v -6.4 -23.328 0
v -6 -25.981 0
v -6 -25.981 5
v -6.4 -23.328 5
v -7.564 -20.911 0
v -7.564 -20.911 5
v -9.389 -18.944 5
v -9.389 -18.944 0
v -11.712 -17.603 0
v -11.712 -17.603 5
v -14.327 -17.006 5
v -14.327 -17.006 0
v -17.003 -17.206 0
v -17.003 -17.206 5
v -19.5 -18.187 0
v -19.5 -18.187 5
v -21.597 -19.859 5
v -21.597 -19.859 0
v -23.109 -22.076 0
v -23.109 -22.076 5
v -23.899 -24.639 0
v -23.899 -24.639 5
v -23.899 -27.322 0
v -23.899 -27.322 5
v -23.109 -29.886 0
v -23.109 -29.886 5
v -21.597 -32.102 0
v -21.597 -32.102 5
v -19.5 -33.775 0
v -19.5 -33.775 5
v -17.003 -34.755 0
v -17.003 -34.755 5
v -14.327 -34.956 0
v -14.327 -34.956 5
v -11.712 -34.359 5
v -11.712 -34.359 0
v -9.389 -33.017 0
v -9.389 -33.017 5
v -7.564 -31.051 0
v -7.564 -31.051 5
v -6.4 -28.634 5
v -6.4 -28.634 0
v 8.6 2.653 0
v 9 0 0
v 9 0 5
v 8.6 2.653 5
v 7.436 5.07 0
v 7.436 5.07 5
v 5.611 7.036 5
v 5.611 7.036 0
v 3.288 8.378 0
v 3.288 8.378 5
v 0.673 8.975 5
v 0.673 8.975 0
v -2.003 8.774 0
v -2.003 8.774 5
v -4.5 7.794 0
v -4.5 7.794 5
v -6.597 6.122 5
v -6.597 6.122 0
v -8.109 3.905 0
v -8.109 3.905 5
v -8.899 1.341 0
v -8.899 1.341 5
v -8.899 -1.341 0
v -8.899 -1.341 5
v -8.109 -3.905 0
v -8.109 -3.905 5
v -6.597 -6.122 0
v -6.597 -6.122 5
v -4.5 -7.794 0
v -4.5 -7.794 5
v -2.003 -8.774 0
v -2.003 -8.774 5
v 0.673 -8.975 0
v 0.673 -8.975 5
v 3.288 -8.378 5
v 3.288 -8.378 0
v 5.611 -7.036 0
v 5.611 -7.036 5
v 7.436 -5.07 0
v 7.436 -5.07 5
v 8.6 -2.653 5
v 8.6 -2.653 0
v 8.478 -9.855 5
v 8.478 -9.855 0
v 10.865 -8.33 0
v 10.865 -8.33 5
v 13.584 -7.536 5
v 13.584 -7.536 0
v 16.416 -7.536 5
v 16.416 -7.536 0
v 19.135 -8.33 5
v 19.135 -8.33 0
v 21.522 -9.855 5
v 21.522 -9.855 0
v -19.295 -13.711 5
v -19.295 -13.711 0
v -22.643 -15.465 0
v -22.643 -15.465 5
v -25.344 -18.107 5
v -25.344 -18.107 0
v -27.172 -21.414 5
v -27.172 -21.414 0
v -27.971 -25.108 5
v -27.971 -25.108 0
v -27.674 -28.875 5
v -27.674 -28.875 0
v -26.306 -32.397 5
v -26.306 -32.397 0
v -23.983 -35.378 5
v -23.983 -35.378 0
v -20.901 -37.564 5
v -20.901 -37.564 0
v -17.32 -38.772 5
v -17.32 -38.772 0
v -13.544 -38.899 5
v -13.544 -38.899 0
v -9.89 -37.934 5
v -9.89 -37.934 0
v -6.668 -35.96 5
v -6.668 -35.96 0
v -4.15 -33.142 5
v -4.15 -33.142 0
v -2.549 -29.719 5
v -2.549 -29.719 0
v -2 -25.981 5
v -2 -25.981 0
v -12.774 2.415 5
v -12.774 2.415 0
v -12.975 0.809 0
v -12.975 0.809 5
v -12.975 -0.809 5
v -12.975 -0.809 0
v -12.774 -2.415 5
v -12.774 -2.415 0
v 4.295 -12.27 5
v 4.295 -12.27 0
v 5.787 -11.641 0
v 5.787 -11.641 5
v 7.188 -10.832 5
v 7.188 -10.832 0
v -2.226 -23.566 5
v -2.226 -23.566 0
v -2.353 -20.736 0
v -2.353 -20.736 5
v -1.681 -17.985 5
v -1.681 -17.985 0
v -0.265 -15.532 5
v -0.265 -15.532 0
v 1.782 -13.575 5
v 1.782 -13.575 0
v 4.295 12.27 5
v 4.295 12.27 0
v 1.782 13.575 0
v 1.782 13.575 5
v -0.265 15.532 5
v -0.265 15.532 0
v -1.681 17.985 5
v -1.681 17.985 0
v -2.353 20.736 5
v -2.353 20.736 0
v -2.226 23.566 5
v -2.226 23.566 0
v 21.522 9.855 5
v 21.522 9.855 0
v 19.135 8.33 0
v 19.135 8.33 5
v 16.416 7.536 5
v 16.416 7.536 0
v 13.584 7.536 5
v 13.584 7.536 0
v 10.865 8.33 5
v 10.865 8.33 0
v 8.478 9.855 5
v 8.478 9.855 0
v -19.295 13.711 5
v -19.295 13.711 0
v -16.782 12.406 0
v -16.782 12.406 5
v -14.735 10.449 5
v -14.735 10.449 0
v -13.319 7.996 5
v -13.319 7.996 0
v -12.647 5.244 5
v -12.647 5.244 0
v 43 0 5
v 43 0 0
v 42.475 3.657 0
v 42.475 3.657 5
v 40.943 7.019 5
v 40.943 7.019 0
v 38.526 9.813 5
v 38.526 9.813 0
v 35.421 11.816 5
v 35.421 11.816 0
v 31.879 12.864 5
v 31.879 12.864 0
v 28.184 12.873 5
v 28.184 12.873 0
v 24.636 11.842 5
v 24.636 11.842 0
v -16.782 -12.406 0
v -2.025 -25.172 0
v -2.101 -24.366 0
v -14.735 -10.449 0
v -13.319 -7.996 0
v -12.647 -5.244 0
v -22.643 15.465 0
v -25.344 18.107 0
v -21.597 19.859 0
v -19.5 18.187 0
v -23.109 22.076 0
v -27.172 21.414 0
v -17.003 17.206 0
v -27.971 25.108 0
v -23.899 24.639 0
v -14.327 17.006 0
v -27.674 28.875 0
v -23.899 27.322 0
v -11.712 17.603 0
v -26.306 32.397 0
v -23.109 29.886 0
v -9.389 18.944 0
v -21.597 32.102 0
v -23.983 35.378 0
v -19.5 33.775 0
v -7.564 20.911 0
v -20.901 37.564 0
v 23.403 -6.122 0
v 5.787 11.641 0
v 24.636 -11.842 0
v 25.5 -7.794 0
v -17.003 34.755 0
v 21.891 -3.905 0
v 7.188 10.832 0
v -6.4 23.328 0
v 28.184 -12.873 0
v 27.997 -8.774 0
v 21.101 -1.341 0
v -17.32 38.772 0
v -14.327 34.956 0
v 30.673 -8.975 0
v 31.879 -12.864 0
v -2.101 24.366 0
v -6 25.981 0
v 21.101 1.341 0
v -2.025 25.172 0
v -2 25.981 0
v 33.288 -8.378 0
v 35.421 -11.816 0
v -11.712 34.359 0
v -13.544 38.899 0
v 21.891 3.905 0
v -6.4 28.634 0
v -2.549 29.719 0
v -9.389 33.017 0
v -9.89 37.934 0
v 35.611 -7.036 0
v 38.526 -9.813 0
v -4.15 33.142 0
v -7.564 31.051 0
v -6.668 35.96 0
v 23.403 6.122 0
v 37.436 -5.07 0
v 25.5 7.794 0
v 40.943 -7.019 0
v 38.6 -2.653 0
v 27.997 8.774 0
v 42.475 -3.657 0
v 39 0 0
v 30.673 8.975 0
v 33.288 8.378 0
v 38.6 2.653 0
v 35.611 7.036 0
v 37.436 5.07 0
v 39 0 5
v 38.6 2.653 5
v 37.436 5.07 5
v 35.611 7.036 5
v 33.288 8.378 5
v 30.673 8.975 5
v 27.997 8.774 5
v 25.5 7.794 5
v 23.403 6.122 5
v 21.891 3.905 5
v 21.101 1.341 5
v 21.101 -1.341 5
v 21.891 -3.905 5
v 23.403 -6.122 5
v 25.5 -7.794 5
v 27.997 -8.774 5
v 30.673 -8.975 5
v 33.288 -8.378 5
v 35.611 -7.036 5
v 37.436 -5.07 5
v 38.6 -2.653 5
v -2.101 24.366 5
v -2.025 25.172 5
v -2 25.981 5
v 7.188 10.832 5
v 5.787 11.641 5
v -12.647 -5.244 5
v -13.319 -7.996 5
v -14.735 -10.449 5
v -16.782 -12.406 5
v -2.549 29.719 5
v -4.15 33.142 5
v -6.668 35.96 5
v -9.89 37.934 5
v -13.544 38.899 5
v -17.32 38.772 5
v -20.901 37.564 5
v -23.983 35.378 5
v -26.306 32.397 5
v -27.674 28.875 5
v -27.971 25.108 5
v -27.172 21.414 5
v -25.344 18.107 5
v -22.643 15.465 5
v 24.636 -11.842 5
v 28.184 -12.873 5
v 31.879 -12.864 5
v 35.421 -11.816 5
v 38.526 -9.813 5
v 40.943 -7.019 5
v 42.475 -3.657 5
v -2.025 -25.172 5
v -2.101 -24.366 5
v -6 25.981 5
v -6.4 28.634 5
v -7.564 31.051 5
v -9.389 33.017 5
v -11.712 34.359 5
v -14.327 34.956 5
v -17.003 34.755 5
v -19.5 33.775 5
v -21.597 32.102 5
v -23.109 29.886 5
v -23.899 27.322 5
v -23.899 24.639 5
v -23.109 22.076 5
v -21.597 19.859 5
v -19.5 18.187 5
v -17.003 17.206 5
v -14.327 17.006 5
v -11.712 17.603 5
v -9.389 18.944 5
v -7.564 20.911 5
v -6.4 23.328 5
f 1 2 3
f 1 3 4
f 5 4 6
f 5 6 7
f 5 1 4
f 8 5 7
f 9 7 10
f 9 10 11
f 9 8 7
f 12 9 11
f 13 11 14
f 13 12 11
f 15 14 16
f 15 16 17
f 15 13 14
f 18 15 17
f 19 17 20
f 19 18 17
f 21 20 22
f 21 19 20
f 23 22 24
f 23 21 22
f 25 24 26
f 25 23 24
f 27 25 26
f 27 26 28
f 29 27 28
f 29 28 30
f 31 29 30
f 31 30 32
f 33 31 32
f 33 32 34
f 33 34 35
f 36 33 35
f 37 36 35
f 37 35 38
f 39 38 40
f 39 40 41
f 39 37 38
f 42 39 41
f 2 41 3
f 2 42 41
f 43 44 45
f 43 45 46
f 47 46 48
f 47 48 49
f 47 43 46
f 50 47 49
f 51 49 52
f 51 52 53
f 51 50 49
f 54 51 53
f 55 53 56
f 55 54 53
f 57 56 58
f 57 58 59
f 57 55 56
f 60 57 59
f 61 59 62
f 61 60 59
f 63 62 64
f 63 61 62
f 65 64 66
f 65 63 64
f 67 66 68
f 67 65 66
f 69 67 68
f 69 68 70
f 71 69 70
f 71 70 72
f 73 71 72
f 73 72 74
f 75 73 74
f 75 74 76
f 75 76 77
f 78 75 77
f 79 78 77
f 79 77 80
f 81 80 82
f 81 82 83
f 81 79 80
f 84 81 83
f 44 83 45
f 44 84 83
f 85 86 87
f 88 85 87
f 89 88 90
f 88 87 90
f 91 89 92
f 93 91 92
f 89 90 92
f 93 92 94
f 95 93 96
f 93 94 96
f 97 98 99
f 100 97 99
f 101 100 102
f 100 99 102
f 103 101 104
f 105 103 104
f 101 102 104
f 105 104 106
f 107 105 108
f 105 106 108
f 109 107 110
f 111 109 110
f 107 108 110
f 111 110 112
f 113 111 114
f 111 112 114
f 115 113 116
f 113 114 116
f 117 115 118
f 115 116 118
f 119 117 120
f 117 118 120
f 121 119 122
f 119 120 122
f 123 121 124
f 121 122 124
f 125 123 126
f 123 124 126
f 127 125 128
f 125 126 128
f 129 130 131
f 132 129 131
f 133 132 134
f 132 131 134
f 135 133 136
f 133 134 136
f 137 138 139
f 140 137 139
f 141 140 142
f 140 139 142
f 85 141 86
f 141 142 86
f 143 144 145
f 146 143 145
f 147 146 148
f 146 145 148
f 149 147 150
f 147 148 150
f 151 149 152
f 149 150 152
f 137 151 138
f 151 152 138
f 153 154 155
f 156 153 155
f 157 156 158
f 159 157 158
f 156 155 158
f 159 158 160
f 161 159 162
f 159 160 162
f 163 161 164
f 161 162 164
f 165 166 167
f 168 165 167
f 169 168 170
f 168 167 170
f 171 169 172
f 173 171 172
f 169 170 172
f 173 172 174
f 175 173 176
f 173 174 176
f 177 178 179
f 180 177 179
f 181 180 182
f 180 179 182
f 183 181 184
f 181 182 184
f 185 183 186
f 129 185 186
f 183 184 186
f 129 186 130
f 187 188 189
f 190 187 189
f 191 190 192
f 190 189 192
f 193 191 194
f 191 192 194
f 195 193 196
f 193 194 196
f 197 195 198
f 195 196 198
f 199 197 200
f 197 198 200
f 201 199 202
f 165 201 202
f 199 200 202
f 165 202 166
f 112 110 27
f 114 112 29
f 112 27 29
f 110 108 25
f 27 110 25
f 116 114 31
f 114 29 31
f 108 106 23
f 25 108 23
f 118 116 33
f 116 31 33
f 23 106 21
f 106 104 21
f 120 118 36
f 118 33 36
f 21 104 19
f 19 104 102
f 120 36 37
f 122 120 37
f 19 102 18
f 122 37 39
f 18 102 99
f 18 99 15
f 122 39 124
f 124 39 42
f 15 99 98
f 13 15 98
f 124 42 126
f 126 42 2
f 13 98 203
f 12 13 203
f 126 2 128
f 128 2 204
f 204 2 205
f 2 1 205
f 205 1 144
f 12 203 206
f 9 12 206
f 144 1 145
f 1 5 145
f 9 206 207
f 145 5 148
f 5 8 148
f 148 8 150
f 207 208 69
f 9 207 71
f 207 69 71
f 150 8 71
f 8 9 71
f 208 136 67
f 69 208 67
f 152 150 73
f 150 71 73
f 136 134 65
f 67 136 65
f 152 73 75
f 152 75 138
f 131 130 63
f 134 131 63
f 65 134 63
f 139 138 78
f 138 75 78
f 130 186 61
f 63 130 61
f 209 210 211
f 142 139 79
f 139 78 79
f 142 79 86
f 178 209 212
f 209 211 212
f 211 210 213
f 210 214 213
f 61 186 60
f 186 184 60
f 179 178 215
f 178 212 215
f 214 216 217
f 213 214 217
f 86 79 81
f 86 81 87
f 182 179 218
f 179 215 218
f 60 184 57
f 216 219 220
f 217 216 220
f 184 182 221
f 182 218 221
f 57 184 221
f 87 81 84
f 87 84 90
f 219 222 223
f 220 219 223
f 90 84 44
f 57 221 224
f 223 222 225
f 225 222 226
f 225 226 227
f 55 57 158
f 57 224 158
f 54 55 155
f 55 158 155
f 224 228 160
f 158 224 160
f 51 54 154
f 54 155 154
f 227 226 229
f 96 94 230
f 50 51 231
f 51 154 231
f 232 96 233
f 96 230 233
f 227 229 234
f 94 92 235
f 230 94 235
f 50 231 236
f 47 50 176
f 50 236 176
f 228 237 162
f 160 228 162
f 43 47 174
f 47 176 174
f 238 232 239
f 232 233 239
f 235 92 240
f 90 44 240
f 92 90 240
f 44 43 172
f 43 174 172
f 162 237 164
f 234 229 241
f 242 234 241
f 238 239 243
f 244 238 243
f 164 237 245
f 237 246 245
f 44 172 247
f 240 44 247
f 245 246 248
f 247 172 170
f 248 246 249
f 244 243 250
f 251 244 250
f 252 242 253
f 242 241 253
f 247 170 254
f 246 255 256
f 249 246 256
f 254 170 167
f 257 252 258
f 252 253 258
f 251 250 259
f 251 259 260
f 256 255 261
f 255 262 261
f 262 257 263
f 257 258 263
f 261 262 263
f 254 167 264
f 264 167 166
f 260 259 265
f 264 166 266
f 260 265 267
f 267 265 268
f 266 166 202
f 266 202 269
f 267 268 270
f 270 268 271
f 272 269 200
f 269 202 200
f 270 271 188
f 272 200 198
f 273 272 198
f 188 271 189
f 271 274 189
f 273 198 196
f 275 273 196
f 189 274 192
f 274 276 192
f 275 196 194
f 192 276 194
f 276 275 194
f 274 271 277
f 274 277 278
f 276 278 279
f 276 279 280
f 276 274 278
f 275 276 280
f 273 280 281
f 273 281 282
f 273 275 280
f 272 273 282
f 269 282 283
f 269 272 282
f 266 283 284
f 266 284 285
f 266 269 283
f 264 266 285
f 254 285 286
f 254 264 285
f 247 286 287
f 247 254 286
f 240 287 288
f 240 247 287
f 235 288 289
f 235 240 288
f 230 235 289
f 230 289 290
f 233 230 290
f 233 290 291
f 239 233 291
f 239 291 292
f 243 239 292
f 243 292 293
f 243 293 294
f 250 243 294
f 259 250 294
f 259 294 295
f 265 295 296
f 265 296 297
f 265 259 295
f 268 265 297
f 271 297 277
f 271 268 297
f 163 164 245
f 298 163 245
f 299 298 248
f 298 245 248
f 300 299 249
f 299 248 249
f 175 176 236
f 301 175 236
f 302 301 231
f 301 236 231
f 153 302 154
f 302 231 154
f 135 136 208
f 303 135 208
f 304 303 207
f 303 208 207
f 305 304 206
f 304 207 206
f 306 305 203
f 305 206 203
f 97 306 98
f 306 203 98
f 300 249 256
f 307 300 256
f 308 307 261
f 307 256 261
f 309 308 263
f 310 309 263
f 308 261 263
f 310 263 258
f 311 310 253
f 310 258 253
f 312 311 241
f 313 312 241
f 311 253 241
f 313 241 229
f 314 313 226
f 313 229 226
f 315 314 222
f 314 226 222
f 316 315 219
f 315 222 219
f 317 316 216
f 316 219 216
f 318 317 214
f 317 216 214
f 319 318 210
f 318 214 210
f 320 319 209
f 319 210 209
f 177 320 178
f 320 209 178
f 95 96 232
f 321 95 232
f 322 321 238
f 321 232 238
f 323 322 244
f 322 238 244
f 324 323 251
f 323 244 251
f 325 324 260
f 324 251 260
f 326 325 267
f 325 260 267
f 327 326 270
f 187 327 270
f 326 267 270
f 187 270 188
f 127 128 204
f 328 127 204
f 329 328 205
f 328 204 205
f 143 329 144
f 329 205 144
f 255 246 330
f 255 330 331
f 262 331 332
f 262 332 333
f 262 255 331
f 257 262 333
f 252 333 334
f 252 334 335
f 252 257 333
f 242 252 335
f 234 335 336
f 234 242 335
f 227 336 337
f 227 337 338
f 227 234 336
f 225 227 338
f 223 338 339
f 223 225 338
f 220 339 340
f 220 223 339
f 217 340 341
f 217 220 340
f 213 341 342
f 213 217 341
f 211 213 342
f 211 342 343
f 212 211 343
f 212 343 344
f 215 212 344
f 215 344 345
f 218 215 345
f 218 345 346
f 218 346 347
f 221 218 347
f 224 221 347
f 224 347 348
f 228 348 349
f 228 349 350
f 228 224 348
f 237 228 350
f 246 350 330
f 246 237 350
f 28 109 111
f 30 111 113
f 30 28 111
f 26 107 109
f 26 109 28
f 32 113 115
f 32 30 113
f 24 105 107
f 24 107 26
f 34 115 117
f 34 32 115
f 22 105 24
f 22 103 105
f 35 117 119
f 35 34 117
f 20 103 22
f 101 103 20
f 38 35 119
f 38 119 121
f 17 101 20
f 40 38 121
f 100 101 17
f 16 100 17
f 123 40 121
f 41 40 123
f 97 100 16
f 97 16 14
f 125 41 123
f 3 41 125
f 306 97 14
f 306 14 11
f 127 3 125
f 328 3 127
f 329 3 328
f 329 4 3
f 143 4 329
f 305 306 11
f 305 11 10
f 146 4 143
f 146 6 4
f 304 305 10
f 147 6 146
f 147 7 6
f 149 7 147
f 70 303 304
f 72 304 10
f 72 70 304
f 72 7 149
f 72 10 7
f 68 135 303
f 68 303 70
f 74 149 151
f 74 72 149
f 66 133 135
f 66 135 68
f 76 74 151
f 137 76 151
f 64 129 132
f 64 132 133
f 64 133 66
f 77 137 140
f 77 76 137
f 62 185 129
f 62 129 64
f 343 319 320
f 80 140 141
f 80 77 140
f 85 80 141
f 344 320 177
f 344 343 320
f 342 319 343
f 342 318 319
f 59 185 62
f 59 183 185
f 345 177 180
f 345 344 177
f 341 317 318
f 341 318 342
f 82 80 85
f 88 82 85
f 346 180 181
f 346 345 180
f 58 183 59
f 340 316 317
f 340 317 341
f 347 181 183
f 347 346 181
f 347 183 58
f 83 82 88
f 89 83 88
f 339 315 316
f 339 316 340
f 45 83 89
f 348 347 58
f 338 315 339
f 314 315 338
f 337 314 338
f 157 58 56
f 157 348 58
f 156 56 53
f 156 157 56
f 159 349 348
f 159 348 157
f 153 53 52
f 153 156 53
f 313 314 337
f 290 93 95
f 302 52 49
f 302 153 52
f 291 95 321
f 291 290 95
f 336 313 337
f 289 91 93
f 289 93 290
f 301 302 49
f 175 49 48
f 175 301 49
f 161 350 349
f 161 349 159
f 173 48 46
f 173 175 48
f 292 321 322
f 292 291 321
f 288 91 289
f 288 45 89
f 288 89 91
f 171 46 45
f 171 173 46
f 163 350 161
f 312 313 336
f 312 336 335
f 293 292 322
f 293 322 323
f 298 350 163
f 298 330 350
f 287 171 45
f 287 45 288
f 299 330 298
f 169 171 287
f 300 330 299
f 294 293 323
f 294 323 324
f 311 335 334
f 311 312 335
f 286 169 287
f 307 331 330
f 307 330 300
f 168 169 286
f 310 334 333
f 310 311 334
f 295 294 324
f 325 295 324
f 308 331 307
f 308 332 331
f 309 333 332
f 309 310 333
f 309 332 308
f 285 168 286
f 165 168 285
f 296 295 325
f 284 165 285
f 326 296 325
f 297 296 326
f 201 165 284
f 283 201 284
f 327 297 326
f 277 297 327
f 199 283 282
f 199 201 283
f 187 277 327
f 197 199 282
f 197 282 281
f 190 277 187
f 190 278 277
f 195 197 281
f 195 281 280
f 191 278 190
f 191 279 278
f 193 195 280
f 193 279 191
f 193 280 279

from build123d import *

# Parameters (mm, degrees)
F0_R     = 9
F1_DEPTH = 5


with BuildPart() as f1:
    # F0 (on Top) → F1 (new body)
    with BuildSketch(Plane.XY):
        with BuildLine():
            ThreePointArc((-19.295465, 13.710922), (-8.5, 14.722432), (-2.226274, 23.565824))
            ThreePointArc((-2.226274, 23.565824), (-2.056692, 24.768004), (-2, 25.980762))
            ThreePointArc((-2, 25.980762), (-22.521933, 36.583617), (-19.295465, 13.710922))
        make_face()
        with Locations((-15, 25.980762)):
            Circle(F0_R, mode=Mode.SUBTRACT)
        with BuildLine():
            ThreePointArc((8.478261, -9.854902), (11.815612, -5.421375), (13, 0))
            ThreePointArc((13, 0), (11.815612, 5.421375), (8.478261, 9.854902))
            ThreePointArc((8.478261, 9.854902), (6.5, 11.25833), (4.295465, 12.26984))
            ThreePointArc((4.295465, 12.26984), (-6.5, 11.25833), (-12.773726, 2.414938))
            ThreePointArc((-12.773726, 2.414938), (-13, 0), (-12.773726, -2.414938))
            ThreePointArc((-12.773726, -2.414938), (-6.5, -11.25833), (4.295465, -12.26984))
            ThreePointArc((4.295465, -12.26984), (6.5, -11.25833), (8.478261, -9.854902))
        make_face()
        Circle(F0_R, mode=Mode.SUBTRACT)
        with BuildLine():
            ThreePointArc((-12.773726, 2.414938), (-6.5, 11.25833), (4.295465, 12.26984))
            ThreePointArc((4.295465, 12.26984), (-1.060585, 16.708179), (-2.226274, 23.565824))
            ThreePointArc((-2.226274, 23.565824), (-8.5, 14.722432), (-19.295465, 13.710922))
            ThreePointArc((-19.295465, 13.710922), (-13.939415, 9.272583), (-12.773726, 2.414938))
        make_face()
        with BuildLine():
            ThreePointArc((8.478261, 9.854902), (11.815612, 5.421375), (13, 0))
            ThreePointArc((13, 0), (11.815612, -5.421375), (8.478261, -9.854902))
            ThreePointArc((8.478261, -9.854902), (15, -7.435596), (21.521739, -9.854902))
            ThreePointArc((21.521739, -9.854902), (17, 0), (21.521739, 9.854902))
            ThreePointArc((21.521739, 9.854902), (15, 7.435596), (8.478261, 9.854902))
        make_face()
        with BuildLine():
            ThreePointArc((43, 0), (35.421375, 11.815612), (21.521739, 9.854902))
            ThreePointArc((21.521739, 9.854902), (17, 0), (21.521739, -9.854902))
            ThreePointArc((21.521739, -9.854902), (35.421375, -11.815612), (43, 0))
        make_face()
        with Locations((30, 0)):
            Circle(F0_R, mode=Mode.SUBTRACT)
        with BuildLine():
            ThreePointArc((-2.226274, -23.565824), (-1.060585, -16.708179), (4.295465, -12.26984))
            ThreePointArc((4.295465, -12.26984), (-6.5, -11.25833), (-12.773726, -2.414938))
            ThreePointArc((-12.773726, -2.414938), (-13.939415, -9.272583), (-19.295465, -13.710922))
            ThreePointArc((-19.295465, -13.710922), (-8.5, -14.722432), (-2.226274, -23.565824))
        make_face()
        with BuildLine():
            ThreePointArc((-2, -25.980762), (-2.056692, -24.768004), (-2.226274, -23.565824))
            ThreePointArc((-2.226274, -23.565824), (-8.5, -14.722432), (-19.295465, -13.710922))
            ThreePointArc((-19.295465, -13.710922), (-22.521933, -36.583617), (-2, -25.980762))
        make_face()
        with Locations((-15, -25.980762)):
            Circle(F0_R, mode=Mode.SUBTRACT)
    extrude(amount=F1_DEPTH)


solid = f1.part
